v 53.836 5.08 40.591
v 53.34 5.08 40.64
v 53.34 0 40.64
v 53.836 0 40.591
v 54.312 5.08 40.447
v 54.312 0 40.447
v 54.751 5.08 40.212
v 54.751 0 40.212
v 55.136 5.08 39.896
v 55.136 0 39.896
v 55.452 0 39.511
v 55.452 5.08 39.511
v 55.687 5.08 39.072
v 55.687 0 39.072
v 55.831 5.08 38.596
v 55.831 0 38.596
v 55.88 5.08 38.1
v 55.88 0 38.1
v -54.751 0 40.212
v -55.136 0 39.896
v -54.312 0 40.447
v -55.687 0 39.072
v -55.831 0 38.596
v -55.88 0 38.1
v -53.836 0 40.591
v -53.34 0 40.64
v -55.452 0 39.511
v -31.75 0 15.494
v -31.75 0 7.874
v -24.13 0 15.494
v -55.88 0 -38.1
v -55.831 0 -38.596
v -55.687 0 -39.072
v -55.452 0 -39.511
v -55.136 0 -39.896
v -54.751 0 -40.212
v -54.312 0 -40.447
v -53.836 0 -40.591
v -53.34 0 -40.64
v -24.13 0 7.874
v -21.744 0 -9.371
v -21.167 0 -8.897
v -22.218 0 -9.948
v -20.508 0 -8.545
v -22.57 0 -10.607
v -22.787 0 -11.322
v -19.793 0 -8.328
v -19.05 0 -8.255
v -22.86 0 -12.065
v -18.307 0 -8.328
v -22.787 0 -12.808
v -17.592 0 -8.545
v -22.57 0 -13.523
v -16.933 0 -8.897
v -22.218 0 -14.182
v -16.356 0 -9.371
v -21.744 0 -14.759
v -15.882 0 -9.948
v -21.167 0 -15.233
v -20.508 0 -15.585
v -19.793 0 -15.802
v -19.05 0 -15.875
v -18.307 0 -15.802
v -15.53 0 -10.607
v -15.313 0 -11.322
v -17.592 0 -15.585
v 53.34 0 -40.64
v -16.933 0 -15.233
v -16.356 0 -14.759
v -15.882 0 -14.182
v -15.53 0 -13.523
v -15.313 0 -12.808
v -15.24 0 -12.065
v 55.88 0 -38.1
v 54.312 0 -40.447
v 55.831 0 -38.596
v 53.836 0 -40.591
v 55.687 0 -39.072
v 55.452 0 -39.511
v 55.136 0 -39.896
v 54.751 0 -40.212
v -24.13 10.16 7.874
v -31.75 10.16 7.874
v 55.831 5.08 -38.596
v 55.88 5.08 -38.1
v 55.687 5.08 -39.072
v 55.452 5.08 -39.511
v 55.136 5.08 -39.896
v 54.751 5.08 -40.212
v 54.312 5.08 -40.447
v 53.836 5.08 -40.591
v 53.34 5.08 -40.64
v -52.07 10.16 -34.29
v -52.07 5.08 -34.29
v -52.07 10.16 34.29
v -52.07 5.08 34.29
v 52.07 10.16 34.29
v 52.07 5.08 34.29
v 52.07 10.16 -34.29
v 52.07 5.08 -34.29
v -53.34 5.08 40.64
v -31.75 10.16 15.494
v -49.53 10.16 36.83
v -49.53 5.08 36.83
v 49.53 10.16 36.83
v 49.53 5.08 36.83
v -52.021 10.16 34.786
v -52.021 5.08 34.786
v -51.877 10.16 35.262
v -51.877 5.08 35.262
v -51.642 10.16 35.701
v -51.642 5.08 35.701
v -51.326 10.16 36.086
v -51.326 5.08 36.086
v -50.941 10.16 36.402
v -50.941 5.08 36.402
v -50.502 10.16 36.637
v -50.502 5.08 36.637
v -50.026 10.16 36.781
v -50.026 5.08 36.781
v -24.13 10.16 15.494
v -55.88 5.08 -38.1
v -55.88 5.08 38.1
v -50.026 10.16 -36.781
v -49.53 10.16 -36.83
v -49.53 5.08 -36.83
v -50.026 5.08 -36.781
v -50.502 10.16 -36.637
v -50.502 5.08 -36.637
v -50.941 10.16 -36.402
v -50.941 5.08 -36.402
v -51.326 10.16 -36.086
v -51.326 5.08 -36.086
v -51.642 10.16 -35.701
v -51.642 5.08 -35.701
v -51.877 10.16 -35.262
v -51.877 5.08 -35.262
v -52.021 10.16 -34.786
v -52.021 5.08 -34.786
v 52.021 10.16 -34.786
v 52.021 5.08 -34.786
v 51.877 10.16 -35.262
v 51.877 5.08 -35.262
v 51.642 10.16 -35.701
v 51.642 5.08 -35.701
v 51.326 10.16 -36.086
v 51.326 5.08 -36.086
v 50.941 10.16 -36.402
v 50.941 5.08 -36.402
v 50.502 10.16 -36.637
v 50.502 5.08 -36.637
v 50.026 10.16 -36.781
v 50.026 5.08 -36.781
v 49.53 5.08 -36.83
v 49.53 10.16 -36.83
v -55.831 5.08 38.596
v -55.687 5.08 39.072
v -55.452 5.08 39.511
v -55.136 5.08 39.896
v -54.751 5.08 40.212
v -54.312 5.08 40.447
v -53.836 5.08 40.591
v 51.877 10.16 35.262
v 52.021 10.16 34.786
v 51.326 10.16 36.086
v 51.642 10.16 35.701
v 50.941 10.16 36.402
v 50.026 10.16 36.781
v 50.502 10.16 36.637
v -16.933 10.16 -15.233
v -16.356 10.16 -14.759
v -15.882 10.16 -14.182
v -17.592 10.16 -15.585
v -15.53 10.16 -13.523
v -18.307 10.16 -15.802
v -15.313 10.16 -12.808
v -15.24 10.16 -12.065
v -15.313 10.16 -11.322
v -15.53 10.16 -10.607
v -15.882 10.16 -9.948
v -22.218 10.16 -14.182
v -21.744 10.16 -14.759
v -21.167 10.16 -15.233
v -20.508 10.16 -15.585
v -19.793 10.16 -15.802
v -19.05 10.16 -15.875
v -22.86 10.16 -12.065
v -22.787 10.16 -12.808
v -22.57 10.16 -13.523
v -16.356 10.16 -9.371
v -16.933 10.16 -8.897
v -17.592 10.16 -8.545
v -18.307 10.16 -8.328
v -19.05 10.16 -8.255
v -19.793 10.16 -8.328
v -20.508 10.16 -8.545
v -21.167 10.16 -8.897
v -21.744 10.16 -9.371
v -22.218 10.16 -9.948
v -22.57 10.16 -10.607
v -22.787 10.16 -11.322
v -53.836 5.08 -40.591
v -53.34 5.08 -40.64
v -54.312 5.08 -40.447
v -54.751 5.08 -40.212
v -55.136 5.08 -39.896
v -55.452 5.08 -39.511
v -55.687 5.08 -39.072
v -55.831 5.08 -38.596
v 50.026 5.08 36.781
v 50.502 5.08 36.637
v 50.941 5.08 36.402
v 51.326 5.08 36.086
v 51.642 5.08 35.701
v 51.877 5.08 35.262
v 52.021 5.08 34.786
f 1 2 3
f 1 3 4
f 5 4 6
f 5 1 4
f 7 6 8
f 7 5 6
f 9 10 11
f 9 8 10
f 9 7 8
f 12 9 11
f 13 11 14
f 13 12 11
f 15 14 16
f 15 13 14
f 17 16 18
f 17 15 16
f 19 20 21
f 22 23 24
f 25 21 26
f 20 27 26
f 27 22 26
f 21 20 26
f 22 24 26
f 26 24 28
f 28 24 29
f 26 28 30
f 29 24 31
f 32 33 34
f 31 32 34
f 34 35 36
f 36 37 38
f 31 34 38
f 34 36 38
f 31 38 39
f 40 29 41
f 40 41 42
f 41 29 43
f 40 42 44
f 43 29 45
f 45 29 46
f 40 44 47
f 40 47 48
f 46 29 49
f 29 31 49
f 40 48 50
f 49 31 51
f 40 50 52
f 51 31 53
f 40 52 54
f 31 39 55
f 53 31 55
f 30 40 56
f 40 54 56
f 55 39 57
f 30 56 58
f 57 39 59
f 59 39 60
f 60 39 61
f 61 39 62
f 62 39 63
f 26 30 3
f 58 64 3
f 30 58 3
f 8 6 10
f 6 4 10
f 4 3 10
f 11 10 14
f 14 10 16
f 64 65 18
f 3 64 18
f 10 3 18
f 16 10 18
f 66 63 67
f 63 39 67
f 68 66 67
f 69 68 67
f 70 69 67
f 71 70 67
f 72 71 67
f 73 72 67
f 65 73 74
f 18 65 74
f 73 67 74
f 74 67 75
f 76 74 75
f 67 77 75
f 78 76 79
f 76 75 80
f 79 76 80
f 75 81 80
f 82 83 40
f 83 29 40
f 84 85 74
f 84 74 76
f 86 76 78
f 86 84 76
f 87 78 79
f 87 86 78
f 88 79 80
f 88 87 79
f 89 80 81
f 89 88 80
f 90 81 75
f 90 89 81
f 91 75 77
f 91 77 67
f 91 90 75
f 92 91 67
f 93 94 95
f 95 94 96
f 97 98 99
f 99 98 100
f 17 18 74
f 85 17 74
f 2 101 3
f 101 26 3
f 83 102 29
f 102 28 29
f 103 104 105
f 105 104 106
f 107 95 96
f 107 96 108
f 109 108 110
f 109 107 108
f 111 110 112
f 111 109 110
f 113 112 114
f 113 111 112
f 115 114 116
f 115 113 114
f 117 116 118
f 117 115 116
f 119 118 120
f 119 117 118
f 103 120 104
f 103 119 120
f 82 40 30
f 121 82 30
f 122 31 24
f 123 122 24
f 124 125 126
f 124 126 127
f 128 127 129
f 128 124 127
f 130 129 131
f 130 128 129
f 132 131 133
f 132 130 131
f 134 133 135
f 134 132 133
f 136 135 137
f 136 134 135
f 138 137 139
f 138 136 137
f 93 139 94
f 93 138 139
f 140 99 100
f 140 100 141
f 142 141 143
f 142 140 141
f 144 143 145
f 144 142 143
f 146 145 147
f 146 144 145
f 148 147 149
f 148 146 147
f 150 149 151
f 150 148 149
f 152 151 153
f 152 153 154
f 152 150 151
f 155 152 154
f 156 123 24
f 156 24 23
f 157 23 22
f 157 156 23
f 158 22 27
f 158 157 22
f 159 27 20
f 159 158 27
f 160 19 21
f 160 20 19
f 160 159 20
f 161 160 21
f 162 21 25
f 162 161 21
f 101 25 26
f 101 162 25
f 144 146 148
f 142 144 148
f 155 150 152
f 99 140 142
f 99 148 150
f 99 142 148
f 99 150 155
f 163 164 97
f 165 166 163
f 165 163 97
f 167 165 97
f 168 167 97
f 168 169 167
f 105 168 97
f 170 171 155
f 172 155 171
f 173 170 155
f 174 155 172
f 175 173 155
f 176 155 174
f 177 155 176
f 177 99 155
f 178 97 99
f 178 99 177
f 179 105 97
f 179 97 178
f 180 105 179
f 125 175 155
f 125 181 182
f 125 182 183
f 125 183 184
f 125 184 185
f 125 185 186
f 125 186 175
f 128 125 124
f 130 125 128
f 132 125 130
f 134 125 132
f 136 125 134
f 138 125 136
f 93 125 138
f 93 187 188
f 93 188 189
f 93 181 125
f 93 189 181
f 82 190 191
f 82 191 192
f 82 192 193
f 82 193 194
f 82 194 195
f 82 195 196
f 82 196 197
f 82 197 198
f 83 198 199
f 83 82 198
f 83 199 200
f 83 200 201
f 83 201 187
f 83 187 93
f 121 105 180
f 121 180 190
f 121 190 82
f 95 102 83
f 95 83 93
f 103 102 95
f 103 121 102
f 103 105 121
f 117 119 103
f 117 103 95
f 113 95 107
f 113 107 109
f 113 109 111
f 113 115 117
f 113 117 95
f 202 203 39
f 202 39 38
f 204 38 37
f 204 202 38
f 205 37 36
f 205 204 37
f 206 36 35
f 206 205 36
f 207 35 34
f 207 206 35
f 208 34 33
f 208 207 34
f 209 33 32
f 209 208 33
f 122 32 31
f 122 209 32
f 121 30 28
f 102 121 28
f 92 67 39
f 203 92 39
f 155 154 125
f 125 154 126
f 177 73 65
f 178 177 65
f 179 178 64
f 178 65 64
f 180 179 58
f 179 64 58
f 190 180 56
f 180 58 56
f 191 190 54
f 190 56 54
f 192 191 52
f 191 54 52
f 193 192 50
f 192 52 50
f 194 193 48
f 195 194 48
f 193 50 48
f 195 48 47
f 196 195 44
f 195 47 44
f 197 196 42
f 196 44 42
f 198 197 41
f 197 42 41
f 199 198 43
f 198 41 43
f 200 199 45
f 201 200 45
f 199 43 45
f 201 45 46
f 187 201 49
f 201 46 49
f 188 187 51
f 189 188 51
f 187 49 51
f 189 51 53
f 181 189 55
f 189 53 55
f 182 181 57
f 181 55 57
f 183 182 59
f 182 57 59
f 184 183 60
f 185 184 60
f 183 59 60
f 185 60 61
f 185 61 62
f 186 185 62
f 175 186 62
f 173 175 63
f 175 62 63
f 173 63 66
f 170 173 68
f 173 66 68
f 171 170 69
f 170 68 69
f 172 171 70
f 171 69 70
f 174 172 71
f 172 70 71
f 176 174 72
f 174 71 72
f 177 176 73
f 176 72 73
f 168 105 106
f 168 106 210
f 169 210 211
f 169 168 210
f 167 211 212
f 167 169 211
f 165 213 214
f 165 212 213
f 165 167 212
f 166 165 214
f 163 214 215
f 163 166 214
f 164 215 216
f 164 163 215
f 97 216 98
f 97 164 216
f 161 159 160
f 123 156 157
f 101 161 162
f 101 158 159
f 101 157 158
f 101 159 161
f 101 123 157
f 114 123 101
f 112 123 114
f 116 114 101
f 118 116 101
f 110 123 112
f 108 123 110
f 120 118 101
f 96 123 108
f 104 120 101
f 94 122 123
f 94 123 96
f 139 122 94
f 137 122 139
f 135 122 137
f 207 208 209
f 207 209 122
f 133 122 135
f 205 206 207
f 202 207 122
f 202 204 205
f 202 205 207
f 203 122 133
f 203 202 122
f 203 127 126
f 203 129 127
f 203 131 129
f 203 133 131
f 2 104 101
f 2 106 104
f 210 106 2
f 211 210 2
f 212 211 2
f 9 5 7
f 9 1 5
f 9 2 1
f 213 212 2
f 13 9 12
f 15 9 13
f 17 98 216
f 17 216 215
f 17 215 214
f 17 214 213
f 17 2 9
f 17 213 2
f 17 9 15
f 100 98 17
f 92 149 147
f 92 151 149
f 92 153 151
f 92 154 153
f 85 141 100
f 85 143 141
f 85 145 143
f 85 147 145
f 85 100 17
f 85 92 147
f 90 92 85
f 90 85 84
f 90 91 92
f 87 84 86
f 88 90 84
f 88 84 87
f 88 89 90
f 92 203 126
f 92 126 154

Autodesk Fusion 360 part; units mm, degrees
sketch "Sketch1" plane through (0, 0, 0) normal (0, 1, 0) x (1, 0, 0) in component "Lid"
sketch "Sketch2" plane through (0, 0, 0) normal (0, 1, 0) x (1, 0, 0) in component "Lid"
sketch "Sketch3" plane through (0, 0, 0) normal (0, 1, 0) x (1, 0, 0) in component "Lid"
  line L0 (55.88, 40.64) -> (-55.88, 40.64)
  line L1 (-55.88, 40.64) -> (-55.88, -40.64)
  line L2 (-55.88, -40.64) -> (55.88, -40.64)
  line L3 (55.88, -40.64) -> (55.88, 40.64)
  line L4 (55.88, 40.64) -> (-55.88, -40.64) construction
  line L5 (-55.88, 40.64) -> (55.88, -40.64) construction
  dimension "d1" = 111.76
  dimension "d2" = 81.28
extrude "Extrude1" add sketch "Sketch3" along normal blind 5.08 in component "Lid"
sketch "Sketch4" plane through (0, 5.08, 0) normal (0, 1, 0) x (-1, 0, 0) in component "Lid"
  line L0 (-55.88, 40.64) -> (-55.88, -40.64)
  line L1 (-55.88, -40.64) -> (55.88, -40.64)
  line L2 (55.88, -40.64) -> (55.88, 40.64)
  line L3 (55.88, 40.64) -> (-55.88, 40.64)
  line L4 (-52.07, -36.83) -> (52.07, -36.83)
  line L5 (52.07, -36.83) -> (52.07, 36.83)
  line L6 (52.07, 36.83) -> (-52.07, 36.83)
  line L7 (-52.07, 36.83) -> (-52.07, -36.83)
  line L8 (-52.07, -36.83) -> (52.07, 36.83) construction
  line L9 (52.07, -36.83) -> (-52.07, 36.83) construction
  dimension "d5" = 104.14
  dimension "d6" = 73.66
extrude "Extrude2" add sketch "Sketch4" along normal blind 5.08 contours L4 L5 L6 L7 in component "Lid"
fillet "Fillet1" radius 2.54 8 edges at (52.07, 7.62, 36.83) (-52.07, 7.62, 36.83) (52.07, 7.62, -36.83) (-52.07, 7.62, -36.83) (-55.88, 2.54, -40.64) (55.88, 2.54, -40.64) (55.88, 2.54, 40.64) (-55.88, 2.54, 40.64) in component "Lid"
sketch "Sketch1 (2)" plane through (0, 0, 0) normal (0, -1, 0) x (1, 0, 0)
  arc A0 (-53.34, 40.64) -> (-55.88, 38.1) centre (-53.34, 38.1) ccw
  line L0 (-55.88, 38.1) -> (-55.88, -38.1)
  arc A1 (-55.88, -38.1) -> (-53.34, -40.64) centre (-53.34, -38.1) ccw
  line L1 (-53.34, -40.64) -> (53.34, -40.64)
  arc A2 (53.34, -40.64) -> (55.88, -38.1) centre (53.34, -38.1) ccw
  line L2 (55.88, -38.1) -> (55.88, 38.1)
  arc A3 (55.88, 38.1) -> (53.34, 40.64) centre (53.34, 38.1) ccw
  line L3 (53.34, 40.64) -> (-53.34, 40.64)
  line L4 (43.815, 27.94) -> (-43.815, 27.94)
  line L5 (-43.815, 27.94) -> (-43.815, -27.94)
  line L6 (-43.815, -27.94) -> (43.815, -27.94)
  line L7 (43.815, -27.94) -> (43.815, 27.94)
  line L8 (43.815, 27.94) -> (-43.815, -27.94) construction
  line L9 (-43.815, 27.94) -> (43.815, -27.94) construction
  dimension "d10" = 87.63
  dimension "d11" = 55.88
sketch "Sketch2 (2)" plane through (0, 0, 0) normal (0, -1, 0) x (1, 0, 0)
  circle A0 centre (-19.05, -12.065) radius 3.81
  dimension "d12" = 7.62
  dimension "d13" = 24.765
  dimension "d14" = 15.875
extrude "Extrude3" cut sketch "Sketch2 (2)" against normal blind 10.16 in component "Lid"
sketch "Sketch3 (2)" plane through (0, 0, 0) normal (0, 1, 0) x (1, 0, 0)
  line L0 (-24.13, -15.494) -> (-31.75, -15.494)
  line L1 (-31.75, -15.494) -> (-31.75, -7.874)
  line L2 (-31.75, -7.874) -> (-24.13, -7.874)
  line L3 (-24.13, -7.874) -> (-24.13, -15.494)
  line L4 (-24.13, -15.494) -> (-31.75, -7.874) construction
  line L5 (-31.75, -15.494) -> (-24.13, -7.874) construction
  dimension "d17" = 7.62
  dimension "d18" = 7.62
  dimension "d19" = 39.624
  dimension "d20" = 15.875
extrude "Extrude4" cut sketch "Sketch3 (2)" along normal blind 10.16 in component "Lid"
component "Lid" placed x (1, 0, 0) y (0, 1, 0) z (0, 0, 1) at (0, 0, 0)
